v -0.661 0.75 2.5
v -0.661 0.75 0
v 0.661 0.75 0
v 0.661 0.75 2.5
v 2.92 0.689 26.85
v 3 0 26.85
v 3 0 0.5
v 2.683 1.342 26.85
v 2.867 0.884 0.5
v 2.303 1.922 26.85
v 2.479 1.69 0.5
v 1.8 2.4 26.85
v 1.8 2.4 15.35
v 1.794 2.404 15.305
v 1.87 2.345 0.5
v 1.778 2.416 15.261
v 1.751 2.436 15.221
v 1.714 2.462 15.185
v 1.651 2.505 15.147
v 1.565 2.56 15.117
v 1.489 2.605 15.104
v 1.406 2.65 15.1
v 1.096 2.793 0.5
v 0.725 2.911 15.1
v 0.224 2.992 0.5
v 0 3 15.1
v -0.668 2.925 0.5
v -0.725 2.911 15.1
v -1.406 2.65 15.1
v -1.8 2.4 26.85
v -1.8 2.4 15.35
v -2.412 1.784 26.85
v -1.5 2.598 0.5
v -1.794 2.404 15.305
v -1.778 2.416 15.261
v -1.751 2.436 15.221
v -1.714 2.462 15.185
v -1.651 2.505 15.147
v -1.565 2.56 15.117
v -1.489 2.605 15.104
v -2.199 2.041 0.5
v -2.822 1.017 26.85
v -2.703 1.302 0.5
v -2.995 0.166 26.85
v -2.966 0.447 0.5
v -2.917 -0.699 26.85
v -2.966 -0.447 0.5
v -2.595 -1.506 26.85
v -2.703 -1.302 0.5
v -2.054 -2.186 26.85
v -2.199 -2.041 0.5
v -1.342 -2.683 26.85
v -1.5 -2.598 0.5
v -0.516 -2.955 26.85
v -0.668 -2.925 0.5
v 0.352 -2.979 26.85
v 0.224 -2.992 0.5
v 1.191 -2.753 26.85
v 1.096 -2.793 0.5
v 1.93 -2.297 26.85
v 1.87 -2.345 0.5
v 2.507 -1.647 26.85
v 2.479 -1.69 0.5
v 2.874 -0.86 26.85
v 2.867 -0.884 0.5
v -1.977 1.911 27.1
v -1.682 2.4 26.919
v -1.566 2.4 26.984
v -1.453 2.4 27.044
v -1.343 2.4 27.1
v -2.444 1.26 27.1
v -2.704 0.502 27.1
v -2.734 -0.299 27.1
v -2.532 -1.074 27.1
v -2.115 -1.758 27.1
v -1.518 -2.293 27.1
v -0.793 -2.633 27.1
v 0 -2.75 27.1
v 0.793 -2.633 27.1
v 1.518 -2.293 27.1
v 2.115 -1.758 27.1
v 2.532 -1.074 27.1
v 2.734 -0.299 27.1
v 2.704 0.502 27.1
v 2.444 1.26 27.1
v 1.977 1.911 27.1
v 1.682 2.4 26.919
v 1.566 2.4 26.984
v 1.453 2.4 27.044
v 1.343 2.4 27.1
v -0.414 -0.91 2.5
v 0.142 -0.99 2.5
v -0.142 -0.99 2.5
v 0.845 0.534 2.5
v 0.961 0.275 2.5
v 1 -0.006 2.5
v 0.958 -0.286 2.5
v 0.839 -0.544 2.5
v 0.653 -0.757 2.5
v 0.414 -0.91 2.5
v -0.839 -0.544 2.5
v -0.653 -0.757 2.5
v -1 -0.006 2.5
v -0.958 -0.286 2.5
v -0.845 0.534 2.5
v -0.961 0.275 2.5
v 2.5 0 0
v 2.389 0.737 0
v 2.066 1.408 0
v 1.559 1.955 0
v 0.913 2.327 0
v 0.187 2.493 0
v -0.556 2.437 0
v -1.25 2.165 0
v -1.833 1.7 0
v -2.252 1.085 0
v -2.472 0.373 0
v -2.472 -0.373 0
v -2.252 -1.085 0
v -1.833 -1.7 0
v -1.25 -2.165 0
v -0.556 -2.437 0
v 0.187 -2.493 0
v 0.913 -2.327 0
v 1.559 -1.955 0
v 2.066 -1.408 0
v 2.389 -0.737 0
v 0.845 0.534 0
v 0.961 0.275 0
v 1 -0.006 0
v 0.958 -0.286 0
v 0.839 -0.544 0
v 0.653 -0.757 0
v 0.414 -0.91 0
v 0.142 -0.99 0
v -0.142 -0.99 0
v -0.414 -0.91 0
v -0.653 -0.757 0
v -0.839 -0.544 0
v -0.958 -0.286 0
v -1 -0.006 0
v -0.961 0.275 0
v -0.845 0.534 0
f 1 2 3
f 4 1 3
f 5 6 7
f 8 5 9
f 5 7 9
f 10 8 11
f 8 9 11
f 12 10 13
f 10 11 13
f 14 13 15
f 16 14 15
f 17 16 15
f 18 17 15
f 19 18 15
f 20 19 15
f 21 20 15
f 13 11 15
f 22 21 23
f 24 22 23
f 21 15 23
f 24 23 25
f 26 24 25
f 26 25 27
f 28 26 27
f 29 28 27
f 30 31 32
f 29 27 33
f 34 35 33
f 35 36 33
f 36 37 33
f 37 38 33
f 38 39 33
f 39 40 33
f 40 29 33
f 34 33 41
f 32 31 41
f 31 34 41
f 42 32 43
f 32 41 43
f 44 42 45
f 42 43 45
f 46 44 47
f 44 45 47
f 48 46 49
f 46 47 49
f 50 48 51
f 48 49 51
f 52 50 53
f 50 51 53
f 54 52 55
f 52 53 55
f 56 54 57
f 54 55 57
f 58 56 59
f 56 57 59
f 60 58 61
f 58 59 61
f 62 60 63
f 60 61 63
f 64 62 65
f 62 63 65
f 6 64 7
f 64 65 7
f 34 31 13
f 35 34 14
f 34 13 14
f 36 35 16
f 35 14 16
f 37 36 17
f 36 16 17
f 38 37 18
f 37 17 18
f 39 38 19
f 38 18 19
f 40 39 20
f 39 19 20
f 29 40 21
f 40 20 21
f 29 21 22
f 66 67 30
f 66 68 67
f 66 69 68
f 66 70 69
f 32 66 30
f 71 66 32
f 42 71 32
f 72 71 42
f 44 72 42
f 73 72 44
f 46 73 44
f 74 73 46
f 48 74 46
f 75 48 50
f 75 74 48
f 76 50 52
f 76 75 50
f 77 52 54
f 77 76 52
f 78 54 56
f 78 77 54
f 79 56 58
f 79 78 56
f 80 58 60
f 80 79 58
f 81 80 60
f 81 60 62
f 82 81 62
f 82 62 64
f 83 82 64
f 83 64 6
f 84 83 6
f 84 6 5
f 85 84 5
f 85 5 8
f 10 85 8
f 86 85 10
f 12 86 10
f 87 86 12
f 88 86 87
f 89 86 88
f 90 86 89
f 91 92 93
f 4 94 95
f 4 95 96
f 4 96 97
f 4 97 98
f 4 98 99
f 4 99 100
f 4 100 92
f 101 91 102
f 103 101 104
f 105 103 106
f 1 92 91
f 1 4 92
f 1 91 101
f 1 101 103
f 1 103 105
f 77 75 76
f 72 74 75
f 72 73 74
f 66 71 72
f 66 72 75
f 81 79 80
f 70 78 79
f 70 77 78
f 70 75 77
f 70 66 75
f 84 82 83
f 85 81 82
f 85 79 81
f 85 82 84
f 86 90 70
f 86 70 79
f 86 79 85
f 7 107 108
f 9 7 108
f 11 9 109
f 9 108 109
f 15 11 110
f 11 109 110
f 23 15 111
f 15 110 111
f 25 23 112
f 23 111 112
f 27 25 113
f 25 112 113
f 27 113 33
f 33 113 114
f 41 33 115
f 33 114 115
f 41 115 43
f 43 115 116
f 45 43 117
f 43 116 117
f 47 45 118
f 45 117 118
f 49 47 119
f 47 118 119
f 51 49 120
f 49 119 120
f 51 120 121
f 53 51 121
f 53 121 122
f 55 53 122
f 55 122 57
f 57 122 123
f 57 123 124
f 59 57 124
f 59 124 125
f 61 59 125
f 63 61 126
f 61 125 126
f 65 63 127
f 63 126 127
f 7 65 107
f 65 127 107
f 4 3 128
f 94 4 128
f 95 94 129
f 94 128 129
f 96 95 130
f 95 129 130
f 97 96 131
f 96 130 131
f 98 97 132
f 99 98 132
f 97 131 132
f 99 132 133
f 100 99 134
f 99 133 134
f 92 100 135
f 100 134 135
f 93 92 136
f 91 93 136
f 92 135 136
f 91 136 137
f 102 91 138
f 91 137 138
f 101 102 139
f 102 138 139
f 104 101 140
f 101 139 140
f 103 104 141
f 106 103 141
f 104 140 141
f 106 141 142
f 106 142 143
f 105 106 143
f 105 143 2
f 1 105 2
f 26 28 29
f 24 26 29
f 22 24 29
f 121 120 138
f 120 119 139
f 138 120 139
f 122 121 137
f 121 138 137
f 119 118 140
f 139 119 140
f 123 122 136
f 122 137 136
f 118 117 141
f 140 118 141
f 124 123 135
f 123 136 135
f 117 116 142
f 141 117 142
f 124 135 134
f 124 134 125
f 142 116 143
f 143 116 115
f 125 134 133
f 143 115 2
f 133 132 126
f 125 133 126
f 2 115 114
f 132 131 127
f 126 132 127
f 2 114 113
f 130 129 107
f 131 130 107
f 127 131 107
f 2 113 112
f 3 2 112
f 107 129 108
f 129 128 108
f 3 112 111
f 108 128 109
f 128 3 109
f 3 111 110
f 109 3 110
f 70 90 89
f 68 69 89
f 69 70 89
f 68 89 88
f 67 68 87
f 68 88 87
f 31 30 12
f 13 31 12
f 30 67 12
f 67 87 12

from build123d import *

# Parameters (mm, degrees)
CROQUIS1_R              = 3
SALIENTE_EXTRUIR1_DEPTH = 27.1
CORTAR_EXTRUIR1_DEPTH   = 12
CHAFL_N1_SIZE           = 0.25
CUT_EXTRUDE2_DEPTH      = 2.5
CHAMFER1_SIZE           = 0.5
FILLET1_R               = 0.25


with BuildPart() as part:
    # Croquis1 → Saliente-Extruir1 (new body)
    with BuildSketch(Plane.XY):
        Circle(CROQUIS1_R)
    extrude(amount=SALIENTE_EXTRUIR1_DEPTH)

    # Croquis2 → Cortar-Extruir1 (cut)
    with BuildSketch(Plane.XY.offset(27.1)):
        with BuildLine():
            Line((-1.8, 2.4), (1.8, 2.4))
            ThreePointArc((1.8, 2.4), (0, 3), (-1.8, 2.4))
        make_face()
    extrude(amount=-CORTAR_EXTRUIR1_DEPTH, mode=Mode.SUBTRACT)

    # Chaflán1
    chafl_n1_edges = [part.edges().sort_by_distance(p)[0] for p in [
        (-1.341640786, -2.683281573, 27.1),
    ]]
    chamfer(chafl_n1_edges, length=CHAFL_N1_SIZE)

    # Sketch1 → Cut-Extrude2 (cut)
    with BuildSketch(Plane(origin=(0, 0, 0), x_dir=(-1, 0, 0), z_dir=(0, 0, -1))):
        with BuildLine():
            Line((0, 0.75), (-0.661437828, 0.75))
            ThreePointArc((-0.661437828, 0.75), (0, -1), (0.661437828, 0.75))
            Line((0.661437828, 0.75), (0, 0.75))
        make_face()
    extrude(amount=-CUT_EXTRUDE2_DEPTH, mode=Mode.SUBTRACT)

    # Chamfer1
    chamfer1_edges = [part.edges().sort_by_distance(p)[0] for p in [
        (-3, 0, 0),
    ]]
    chamfer(chamfer1_edges, length=CHAMFER1_SIZE)

    # Fillet1
    fillet1_edges = [part.edges().sort_by_distance(p)[0] for p in [
        (0, 2.4, 15.1),
    ]]
    fillet(fillet1_edges, radius=FILLET1_R)


solid = part.part
